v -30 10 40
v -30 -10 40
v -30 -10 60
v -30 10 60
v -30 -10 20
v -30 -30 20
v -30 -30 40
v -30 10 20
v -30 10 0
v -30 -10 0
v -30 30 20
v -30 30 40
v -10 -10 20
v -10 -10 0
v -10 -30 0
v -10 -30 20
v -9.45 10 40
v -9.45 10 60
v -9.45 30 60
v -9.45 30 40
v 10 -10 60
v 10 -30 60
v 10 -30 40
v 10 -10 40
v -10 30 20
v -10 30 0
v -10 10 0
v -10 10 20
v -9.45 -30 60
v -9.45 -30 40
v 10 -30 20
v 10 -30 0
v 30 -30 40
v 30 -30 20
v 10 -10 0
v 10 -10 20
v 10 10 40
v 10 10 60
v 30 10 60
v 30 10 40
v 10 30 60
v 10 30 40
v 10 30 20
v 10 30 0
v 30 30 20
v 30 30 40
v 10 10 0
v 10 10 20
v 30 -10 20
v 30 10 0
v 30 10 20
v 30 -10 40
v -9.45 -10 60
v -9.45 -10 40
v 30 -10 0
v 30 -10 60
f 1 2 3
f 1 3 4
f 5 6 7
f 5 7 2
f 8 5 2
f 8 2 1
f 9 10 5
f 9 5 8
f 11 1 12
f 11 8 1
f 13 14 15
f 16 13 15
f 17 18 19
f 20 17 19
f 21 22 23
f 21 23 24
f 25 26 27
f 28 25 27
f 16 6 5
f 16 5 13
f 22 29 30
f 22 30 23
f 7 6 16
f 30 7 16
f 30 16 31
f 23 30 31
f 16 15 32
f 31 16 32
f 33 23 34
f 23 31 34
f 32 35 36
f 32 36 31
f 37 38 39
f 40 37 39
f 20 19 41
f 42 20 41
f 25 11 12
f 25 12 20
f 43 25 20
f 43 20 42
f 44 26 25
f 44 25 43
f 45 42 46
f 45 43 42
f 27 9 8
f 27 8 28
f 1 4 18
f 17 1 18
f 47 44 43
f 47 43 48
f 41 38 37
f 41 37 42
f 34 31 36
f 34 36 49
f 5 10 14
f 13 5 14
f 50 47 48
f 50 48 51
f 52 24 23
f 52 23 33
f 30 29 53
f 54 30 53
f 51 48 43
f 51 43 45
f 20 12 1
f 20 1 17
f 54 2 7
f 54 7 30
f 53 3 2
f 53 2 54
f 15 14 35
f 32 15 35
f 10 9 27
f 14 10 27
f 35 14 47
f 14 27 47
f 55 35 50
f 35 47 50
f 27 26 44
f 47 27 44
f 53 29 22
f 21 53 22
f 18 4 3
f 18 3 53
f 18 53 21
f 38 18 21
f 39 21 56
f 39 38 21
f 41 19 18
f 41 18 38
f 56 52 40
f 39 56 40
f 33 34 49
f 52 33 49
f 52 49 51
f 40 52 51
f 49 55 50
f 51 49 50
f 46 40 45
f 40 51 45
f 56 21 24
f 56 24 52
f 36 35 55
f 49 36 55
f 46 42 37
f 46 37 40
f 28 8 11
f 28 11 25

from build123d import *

# Parameters (mm, degrees)
F0_W     = 60
F0_H     = 60
F1_DEPTH = 60
F2_W     = 20.549892
F2_H     = 20
F2_W_2   = 20
F3_DEPTH = 20
F4_W     = 20
F4_H     = 20
F5_DEPTH = 20


with BuildPart() as f1:
    # F0 (on Top) → F1 (new body)
    with BuildSketch(Plane.XY):
        Rectangle(F0_W, F0_H)
    extrude(amount=F1_DEPTH)

    # F2 (on face) → F3 (cut)
    with BuildSketch(Plane.XY.offset(60)):
        with Locations((-19.725054, 20)):
            Rectangle(F2_W, F2_H)
        with Locations((20, 20)):
            Rectangle(F2_W_2, F2_H)
        with Locations((20, -20)):
            Rectangle(F2_W_2, F2_H)
        with Locations((-19.725054, -20)):
            Rectangle(F2_W, F2_H)
    extrude(amount=-F3_DEPTH, mode=Mode.SUBTRACT)

    # F4 (on face) → F5 (cut)
    with BuildSketch(Plane(origin=(0, 0, 0), x_dir=(1, 0, 0), z_dir=(0, 0, -1))):
        with Locations((20, -20)):
            Rectangle(F4_W, F4_H)
        with Locations((-20, -20)):
            Rectangle(F4_W, F4_H)
        with Locations((-20, 20)):
            Rectangle(F4_W, F4_H)
        with Locations((20, 20)):
            Rectangle(F4_W, F4_H)
    extrude(amount=-F5_DEPTH, mode=Mode.SUBTRACT)


solid = f1.part
